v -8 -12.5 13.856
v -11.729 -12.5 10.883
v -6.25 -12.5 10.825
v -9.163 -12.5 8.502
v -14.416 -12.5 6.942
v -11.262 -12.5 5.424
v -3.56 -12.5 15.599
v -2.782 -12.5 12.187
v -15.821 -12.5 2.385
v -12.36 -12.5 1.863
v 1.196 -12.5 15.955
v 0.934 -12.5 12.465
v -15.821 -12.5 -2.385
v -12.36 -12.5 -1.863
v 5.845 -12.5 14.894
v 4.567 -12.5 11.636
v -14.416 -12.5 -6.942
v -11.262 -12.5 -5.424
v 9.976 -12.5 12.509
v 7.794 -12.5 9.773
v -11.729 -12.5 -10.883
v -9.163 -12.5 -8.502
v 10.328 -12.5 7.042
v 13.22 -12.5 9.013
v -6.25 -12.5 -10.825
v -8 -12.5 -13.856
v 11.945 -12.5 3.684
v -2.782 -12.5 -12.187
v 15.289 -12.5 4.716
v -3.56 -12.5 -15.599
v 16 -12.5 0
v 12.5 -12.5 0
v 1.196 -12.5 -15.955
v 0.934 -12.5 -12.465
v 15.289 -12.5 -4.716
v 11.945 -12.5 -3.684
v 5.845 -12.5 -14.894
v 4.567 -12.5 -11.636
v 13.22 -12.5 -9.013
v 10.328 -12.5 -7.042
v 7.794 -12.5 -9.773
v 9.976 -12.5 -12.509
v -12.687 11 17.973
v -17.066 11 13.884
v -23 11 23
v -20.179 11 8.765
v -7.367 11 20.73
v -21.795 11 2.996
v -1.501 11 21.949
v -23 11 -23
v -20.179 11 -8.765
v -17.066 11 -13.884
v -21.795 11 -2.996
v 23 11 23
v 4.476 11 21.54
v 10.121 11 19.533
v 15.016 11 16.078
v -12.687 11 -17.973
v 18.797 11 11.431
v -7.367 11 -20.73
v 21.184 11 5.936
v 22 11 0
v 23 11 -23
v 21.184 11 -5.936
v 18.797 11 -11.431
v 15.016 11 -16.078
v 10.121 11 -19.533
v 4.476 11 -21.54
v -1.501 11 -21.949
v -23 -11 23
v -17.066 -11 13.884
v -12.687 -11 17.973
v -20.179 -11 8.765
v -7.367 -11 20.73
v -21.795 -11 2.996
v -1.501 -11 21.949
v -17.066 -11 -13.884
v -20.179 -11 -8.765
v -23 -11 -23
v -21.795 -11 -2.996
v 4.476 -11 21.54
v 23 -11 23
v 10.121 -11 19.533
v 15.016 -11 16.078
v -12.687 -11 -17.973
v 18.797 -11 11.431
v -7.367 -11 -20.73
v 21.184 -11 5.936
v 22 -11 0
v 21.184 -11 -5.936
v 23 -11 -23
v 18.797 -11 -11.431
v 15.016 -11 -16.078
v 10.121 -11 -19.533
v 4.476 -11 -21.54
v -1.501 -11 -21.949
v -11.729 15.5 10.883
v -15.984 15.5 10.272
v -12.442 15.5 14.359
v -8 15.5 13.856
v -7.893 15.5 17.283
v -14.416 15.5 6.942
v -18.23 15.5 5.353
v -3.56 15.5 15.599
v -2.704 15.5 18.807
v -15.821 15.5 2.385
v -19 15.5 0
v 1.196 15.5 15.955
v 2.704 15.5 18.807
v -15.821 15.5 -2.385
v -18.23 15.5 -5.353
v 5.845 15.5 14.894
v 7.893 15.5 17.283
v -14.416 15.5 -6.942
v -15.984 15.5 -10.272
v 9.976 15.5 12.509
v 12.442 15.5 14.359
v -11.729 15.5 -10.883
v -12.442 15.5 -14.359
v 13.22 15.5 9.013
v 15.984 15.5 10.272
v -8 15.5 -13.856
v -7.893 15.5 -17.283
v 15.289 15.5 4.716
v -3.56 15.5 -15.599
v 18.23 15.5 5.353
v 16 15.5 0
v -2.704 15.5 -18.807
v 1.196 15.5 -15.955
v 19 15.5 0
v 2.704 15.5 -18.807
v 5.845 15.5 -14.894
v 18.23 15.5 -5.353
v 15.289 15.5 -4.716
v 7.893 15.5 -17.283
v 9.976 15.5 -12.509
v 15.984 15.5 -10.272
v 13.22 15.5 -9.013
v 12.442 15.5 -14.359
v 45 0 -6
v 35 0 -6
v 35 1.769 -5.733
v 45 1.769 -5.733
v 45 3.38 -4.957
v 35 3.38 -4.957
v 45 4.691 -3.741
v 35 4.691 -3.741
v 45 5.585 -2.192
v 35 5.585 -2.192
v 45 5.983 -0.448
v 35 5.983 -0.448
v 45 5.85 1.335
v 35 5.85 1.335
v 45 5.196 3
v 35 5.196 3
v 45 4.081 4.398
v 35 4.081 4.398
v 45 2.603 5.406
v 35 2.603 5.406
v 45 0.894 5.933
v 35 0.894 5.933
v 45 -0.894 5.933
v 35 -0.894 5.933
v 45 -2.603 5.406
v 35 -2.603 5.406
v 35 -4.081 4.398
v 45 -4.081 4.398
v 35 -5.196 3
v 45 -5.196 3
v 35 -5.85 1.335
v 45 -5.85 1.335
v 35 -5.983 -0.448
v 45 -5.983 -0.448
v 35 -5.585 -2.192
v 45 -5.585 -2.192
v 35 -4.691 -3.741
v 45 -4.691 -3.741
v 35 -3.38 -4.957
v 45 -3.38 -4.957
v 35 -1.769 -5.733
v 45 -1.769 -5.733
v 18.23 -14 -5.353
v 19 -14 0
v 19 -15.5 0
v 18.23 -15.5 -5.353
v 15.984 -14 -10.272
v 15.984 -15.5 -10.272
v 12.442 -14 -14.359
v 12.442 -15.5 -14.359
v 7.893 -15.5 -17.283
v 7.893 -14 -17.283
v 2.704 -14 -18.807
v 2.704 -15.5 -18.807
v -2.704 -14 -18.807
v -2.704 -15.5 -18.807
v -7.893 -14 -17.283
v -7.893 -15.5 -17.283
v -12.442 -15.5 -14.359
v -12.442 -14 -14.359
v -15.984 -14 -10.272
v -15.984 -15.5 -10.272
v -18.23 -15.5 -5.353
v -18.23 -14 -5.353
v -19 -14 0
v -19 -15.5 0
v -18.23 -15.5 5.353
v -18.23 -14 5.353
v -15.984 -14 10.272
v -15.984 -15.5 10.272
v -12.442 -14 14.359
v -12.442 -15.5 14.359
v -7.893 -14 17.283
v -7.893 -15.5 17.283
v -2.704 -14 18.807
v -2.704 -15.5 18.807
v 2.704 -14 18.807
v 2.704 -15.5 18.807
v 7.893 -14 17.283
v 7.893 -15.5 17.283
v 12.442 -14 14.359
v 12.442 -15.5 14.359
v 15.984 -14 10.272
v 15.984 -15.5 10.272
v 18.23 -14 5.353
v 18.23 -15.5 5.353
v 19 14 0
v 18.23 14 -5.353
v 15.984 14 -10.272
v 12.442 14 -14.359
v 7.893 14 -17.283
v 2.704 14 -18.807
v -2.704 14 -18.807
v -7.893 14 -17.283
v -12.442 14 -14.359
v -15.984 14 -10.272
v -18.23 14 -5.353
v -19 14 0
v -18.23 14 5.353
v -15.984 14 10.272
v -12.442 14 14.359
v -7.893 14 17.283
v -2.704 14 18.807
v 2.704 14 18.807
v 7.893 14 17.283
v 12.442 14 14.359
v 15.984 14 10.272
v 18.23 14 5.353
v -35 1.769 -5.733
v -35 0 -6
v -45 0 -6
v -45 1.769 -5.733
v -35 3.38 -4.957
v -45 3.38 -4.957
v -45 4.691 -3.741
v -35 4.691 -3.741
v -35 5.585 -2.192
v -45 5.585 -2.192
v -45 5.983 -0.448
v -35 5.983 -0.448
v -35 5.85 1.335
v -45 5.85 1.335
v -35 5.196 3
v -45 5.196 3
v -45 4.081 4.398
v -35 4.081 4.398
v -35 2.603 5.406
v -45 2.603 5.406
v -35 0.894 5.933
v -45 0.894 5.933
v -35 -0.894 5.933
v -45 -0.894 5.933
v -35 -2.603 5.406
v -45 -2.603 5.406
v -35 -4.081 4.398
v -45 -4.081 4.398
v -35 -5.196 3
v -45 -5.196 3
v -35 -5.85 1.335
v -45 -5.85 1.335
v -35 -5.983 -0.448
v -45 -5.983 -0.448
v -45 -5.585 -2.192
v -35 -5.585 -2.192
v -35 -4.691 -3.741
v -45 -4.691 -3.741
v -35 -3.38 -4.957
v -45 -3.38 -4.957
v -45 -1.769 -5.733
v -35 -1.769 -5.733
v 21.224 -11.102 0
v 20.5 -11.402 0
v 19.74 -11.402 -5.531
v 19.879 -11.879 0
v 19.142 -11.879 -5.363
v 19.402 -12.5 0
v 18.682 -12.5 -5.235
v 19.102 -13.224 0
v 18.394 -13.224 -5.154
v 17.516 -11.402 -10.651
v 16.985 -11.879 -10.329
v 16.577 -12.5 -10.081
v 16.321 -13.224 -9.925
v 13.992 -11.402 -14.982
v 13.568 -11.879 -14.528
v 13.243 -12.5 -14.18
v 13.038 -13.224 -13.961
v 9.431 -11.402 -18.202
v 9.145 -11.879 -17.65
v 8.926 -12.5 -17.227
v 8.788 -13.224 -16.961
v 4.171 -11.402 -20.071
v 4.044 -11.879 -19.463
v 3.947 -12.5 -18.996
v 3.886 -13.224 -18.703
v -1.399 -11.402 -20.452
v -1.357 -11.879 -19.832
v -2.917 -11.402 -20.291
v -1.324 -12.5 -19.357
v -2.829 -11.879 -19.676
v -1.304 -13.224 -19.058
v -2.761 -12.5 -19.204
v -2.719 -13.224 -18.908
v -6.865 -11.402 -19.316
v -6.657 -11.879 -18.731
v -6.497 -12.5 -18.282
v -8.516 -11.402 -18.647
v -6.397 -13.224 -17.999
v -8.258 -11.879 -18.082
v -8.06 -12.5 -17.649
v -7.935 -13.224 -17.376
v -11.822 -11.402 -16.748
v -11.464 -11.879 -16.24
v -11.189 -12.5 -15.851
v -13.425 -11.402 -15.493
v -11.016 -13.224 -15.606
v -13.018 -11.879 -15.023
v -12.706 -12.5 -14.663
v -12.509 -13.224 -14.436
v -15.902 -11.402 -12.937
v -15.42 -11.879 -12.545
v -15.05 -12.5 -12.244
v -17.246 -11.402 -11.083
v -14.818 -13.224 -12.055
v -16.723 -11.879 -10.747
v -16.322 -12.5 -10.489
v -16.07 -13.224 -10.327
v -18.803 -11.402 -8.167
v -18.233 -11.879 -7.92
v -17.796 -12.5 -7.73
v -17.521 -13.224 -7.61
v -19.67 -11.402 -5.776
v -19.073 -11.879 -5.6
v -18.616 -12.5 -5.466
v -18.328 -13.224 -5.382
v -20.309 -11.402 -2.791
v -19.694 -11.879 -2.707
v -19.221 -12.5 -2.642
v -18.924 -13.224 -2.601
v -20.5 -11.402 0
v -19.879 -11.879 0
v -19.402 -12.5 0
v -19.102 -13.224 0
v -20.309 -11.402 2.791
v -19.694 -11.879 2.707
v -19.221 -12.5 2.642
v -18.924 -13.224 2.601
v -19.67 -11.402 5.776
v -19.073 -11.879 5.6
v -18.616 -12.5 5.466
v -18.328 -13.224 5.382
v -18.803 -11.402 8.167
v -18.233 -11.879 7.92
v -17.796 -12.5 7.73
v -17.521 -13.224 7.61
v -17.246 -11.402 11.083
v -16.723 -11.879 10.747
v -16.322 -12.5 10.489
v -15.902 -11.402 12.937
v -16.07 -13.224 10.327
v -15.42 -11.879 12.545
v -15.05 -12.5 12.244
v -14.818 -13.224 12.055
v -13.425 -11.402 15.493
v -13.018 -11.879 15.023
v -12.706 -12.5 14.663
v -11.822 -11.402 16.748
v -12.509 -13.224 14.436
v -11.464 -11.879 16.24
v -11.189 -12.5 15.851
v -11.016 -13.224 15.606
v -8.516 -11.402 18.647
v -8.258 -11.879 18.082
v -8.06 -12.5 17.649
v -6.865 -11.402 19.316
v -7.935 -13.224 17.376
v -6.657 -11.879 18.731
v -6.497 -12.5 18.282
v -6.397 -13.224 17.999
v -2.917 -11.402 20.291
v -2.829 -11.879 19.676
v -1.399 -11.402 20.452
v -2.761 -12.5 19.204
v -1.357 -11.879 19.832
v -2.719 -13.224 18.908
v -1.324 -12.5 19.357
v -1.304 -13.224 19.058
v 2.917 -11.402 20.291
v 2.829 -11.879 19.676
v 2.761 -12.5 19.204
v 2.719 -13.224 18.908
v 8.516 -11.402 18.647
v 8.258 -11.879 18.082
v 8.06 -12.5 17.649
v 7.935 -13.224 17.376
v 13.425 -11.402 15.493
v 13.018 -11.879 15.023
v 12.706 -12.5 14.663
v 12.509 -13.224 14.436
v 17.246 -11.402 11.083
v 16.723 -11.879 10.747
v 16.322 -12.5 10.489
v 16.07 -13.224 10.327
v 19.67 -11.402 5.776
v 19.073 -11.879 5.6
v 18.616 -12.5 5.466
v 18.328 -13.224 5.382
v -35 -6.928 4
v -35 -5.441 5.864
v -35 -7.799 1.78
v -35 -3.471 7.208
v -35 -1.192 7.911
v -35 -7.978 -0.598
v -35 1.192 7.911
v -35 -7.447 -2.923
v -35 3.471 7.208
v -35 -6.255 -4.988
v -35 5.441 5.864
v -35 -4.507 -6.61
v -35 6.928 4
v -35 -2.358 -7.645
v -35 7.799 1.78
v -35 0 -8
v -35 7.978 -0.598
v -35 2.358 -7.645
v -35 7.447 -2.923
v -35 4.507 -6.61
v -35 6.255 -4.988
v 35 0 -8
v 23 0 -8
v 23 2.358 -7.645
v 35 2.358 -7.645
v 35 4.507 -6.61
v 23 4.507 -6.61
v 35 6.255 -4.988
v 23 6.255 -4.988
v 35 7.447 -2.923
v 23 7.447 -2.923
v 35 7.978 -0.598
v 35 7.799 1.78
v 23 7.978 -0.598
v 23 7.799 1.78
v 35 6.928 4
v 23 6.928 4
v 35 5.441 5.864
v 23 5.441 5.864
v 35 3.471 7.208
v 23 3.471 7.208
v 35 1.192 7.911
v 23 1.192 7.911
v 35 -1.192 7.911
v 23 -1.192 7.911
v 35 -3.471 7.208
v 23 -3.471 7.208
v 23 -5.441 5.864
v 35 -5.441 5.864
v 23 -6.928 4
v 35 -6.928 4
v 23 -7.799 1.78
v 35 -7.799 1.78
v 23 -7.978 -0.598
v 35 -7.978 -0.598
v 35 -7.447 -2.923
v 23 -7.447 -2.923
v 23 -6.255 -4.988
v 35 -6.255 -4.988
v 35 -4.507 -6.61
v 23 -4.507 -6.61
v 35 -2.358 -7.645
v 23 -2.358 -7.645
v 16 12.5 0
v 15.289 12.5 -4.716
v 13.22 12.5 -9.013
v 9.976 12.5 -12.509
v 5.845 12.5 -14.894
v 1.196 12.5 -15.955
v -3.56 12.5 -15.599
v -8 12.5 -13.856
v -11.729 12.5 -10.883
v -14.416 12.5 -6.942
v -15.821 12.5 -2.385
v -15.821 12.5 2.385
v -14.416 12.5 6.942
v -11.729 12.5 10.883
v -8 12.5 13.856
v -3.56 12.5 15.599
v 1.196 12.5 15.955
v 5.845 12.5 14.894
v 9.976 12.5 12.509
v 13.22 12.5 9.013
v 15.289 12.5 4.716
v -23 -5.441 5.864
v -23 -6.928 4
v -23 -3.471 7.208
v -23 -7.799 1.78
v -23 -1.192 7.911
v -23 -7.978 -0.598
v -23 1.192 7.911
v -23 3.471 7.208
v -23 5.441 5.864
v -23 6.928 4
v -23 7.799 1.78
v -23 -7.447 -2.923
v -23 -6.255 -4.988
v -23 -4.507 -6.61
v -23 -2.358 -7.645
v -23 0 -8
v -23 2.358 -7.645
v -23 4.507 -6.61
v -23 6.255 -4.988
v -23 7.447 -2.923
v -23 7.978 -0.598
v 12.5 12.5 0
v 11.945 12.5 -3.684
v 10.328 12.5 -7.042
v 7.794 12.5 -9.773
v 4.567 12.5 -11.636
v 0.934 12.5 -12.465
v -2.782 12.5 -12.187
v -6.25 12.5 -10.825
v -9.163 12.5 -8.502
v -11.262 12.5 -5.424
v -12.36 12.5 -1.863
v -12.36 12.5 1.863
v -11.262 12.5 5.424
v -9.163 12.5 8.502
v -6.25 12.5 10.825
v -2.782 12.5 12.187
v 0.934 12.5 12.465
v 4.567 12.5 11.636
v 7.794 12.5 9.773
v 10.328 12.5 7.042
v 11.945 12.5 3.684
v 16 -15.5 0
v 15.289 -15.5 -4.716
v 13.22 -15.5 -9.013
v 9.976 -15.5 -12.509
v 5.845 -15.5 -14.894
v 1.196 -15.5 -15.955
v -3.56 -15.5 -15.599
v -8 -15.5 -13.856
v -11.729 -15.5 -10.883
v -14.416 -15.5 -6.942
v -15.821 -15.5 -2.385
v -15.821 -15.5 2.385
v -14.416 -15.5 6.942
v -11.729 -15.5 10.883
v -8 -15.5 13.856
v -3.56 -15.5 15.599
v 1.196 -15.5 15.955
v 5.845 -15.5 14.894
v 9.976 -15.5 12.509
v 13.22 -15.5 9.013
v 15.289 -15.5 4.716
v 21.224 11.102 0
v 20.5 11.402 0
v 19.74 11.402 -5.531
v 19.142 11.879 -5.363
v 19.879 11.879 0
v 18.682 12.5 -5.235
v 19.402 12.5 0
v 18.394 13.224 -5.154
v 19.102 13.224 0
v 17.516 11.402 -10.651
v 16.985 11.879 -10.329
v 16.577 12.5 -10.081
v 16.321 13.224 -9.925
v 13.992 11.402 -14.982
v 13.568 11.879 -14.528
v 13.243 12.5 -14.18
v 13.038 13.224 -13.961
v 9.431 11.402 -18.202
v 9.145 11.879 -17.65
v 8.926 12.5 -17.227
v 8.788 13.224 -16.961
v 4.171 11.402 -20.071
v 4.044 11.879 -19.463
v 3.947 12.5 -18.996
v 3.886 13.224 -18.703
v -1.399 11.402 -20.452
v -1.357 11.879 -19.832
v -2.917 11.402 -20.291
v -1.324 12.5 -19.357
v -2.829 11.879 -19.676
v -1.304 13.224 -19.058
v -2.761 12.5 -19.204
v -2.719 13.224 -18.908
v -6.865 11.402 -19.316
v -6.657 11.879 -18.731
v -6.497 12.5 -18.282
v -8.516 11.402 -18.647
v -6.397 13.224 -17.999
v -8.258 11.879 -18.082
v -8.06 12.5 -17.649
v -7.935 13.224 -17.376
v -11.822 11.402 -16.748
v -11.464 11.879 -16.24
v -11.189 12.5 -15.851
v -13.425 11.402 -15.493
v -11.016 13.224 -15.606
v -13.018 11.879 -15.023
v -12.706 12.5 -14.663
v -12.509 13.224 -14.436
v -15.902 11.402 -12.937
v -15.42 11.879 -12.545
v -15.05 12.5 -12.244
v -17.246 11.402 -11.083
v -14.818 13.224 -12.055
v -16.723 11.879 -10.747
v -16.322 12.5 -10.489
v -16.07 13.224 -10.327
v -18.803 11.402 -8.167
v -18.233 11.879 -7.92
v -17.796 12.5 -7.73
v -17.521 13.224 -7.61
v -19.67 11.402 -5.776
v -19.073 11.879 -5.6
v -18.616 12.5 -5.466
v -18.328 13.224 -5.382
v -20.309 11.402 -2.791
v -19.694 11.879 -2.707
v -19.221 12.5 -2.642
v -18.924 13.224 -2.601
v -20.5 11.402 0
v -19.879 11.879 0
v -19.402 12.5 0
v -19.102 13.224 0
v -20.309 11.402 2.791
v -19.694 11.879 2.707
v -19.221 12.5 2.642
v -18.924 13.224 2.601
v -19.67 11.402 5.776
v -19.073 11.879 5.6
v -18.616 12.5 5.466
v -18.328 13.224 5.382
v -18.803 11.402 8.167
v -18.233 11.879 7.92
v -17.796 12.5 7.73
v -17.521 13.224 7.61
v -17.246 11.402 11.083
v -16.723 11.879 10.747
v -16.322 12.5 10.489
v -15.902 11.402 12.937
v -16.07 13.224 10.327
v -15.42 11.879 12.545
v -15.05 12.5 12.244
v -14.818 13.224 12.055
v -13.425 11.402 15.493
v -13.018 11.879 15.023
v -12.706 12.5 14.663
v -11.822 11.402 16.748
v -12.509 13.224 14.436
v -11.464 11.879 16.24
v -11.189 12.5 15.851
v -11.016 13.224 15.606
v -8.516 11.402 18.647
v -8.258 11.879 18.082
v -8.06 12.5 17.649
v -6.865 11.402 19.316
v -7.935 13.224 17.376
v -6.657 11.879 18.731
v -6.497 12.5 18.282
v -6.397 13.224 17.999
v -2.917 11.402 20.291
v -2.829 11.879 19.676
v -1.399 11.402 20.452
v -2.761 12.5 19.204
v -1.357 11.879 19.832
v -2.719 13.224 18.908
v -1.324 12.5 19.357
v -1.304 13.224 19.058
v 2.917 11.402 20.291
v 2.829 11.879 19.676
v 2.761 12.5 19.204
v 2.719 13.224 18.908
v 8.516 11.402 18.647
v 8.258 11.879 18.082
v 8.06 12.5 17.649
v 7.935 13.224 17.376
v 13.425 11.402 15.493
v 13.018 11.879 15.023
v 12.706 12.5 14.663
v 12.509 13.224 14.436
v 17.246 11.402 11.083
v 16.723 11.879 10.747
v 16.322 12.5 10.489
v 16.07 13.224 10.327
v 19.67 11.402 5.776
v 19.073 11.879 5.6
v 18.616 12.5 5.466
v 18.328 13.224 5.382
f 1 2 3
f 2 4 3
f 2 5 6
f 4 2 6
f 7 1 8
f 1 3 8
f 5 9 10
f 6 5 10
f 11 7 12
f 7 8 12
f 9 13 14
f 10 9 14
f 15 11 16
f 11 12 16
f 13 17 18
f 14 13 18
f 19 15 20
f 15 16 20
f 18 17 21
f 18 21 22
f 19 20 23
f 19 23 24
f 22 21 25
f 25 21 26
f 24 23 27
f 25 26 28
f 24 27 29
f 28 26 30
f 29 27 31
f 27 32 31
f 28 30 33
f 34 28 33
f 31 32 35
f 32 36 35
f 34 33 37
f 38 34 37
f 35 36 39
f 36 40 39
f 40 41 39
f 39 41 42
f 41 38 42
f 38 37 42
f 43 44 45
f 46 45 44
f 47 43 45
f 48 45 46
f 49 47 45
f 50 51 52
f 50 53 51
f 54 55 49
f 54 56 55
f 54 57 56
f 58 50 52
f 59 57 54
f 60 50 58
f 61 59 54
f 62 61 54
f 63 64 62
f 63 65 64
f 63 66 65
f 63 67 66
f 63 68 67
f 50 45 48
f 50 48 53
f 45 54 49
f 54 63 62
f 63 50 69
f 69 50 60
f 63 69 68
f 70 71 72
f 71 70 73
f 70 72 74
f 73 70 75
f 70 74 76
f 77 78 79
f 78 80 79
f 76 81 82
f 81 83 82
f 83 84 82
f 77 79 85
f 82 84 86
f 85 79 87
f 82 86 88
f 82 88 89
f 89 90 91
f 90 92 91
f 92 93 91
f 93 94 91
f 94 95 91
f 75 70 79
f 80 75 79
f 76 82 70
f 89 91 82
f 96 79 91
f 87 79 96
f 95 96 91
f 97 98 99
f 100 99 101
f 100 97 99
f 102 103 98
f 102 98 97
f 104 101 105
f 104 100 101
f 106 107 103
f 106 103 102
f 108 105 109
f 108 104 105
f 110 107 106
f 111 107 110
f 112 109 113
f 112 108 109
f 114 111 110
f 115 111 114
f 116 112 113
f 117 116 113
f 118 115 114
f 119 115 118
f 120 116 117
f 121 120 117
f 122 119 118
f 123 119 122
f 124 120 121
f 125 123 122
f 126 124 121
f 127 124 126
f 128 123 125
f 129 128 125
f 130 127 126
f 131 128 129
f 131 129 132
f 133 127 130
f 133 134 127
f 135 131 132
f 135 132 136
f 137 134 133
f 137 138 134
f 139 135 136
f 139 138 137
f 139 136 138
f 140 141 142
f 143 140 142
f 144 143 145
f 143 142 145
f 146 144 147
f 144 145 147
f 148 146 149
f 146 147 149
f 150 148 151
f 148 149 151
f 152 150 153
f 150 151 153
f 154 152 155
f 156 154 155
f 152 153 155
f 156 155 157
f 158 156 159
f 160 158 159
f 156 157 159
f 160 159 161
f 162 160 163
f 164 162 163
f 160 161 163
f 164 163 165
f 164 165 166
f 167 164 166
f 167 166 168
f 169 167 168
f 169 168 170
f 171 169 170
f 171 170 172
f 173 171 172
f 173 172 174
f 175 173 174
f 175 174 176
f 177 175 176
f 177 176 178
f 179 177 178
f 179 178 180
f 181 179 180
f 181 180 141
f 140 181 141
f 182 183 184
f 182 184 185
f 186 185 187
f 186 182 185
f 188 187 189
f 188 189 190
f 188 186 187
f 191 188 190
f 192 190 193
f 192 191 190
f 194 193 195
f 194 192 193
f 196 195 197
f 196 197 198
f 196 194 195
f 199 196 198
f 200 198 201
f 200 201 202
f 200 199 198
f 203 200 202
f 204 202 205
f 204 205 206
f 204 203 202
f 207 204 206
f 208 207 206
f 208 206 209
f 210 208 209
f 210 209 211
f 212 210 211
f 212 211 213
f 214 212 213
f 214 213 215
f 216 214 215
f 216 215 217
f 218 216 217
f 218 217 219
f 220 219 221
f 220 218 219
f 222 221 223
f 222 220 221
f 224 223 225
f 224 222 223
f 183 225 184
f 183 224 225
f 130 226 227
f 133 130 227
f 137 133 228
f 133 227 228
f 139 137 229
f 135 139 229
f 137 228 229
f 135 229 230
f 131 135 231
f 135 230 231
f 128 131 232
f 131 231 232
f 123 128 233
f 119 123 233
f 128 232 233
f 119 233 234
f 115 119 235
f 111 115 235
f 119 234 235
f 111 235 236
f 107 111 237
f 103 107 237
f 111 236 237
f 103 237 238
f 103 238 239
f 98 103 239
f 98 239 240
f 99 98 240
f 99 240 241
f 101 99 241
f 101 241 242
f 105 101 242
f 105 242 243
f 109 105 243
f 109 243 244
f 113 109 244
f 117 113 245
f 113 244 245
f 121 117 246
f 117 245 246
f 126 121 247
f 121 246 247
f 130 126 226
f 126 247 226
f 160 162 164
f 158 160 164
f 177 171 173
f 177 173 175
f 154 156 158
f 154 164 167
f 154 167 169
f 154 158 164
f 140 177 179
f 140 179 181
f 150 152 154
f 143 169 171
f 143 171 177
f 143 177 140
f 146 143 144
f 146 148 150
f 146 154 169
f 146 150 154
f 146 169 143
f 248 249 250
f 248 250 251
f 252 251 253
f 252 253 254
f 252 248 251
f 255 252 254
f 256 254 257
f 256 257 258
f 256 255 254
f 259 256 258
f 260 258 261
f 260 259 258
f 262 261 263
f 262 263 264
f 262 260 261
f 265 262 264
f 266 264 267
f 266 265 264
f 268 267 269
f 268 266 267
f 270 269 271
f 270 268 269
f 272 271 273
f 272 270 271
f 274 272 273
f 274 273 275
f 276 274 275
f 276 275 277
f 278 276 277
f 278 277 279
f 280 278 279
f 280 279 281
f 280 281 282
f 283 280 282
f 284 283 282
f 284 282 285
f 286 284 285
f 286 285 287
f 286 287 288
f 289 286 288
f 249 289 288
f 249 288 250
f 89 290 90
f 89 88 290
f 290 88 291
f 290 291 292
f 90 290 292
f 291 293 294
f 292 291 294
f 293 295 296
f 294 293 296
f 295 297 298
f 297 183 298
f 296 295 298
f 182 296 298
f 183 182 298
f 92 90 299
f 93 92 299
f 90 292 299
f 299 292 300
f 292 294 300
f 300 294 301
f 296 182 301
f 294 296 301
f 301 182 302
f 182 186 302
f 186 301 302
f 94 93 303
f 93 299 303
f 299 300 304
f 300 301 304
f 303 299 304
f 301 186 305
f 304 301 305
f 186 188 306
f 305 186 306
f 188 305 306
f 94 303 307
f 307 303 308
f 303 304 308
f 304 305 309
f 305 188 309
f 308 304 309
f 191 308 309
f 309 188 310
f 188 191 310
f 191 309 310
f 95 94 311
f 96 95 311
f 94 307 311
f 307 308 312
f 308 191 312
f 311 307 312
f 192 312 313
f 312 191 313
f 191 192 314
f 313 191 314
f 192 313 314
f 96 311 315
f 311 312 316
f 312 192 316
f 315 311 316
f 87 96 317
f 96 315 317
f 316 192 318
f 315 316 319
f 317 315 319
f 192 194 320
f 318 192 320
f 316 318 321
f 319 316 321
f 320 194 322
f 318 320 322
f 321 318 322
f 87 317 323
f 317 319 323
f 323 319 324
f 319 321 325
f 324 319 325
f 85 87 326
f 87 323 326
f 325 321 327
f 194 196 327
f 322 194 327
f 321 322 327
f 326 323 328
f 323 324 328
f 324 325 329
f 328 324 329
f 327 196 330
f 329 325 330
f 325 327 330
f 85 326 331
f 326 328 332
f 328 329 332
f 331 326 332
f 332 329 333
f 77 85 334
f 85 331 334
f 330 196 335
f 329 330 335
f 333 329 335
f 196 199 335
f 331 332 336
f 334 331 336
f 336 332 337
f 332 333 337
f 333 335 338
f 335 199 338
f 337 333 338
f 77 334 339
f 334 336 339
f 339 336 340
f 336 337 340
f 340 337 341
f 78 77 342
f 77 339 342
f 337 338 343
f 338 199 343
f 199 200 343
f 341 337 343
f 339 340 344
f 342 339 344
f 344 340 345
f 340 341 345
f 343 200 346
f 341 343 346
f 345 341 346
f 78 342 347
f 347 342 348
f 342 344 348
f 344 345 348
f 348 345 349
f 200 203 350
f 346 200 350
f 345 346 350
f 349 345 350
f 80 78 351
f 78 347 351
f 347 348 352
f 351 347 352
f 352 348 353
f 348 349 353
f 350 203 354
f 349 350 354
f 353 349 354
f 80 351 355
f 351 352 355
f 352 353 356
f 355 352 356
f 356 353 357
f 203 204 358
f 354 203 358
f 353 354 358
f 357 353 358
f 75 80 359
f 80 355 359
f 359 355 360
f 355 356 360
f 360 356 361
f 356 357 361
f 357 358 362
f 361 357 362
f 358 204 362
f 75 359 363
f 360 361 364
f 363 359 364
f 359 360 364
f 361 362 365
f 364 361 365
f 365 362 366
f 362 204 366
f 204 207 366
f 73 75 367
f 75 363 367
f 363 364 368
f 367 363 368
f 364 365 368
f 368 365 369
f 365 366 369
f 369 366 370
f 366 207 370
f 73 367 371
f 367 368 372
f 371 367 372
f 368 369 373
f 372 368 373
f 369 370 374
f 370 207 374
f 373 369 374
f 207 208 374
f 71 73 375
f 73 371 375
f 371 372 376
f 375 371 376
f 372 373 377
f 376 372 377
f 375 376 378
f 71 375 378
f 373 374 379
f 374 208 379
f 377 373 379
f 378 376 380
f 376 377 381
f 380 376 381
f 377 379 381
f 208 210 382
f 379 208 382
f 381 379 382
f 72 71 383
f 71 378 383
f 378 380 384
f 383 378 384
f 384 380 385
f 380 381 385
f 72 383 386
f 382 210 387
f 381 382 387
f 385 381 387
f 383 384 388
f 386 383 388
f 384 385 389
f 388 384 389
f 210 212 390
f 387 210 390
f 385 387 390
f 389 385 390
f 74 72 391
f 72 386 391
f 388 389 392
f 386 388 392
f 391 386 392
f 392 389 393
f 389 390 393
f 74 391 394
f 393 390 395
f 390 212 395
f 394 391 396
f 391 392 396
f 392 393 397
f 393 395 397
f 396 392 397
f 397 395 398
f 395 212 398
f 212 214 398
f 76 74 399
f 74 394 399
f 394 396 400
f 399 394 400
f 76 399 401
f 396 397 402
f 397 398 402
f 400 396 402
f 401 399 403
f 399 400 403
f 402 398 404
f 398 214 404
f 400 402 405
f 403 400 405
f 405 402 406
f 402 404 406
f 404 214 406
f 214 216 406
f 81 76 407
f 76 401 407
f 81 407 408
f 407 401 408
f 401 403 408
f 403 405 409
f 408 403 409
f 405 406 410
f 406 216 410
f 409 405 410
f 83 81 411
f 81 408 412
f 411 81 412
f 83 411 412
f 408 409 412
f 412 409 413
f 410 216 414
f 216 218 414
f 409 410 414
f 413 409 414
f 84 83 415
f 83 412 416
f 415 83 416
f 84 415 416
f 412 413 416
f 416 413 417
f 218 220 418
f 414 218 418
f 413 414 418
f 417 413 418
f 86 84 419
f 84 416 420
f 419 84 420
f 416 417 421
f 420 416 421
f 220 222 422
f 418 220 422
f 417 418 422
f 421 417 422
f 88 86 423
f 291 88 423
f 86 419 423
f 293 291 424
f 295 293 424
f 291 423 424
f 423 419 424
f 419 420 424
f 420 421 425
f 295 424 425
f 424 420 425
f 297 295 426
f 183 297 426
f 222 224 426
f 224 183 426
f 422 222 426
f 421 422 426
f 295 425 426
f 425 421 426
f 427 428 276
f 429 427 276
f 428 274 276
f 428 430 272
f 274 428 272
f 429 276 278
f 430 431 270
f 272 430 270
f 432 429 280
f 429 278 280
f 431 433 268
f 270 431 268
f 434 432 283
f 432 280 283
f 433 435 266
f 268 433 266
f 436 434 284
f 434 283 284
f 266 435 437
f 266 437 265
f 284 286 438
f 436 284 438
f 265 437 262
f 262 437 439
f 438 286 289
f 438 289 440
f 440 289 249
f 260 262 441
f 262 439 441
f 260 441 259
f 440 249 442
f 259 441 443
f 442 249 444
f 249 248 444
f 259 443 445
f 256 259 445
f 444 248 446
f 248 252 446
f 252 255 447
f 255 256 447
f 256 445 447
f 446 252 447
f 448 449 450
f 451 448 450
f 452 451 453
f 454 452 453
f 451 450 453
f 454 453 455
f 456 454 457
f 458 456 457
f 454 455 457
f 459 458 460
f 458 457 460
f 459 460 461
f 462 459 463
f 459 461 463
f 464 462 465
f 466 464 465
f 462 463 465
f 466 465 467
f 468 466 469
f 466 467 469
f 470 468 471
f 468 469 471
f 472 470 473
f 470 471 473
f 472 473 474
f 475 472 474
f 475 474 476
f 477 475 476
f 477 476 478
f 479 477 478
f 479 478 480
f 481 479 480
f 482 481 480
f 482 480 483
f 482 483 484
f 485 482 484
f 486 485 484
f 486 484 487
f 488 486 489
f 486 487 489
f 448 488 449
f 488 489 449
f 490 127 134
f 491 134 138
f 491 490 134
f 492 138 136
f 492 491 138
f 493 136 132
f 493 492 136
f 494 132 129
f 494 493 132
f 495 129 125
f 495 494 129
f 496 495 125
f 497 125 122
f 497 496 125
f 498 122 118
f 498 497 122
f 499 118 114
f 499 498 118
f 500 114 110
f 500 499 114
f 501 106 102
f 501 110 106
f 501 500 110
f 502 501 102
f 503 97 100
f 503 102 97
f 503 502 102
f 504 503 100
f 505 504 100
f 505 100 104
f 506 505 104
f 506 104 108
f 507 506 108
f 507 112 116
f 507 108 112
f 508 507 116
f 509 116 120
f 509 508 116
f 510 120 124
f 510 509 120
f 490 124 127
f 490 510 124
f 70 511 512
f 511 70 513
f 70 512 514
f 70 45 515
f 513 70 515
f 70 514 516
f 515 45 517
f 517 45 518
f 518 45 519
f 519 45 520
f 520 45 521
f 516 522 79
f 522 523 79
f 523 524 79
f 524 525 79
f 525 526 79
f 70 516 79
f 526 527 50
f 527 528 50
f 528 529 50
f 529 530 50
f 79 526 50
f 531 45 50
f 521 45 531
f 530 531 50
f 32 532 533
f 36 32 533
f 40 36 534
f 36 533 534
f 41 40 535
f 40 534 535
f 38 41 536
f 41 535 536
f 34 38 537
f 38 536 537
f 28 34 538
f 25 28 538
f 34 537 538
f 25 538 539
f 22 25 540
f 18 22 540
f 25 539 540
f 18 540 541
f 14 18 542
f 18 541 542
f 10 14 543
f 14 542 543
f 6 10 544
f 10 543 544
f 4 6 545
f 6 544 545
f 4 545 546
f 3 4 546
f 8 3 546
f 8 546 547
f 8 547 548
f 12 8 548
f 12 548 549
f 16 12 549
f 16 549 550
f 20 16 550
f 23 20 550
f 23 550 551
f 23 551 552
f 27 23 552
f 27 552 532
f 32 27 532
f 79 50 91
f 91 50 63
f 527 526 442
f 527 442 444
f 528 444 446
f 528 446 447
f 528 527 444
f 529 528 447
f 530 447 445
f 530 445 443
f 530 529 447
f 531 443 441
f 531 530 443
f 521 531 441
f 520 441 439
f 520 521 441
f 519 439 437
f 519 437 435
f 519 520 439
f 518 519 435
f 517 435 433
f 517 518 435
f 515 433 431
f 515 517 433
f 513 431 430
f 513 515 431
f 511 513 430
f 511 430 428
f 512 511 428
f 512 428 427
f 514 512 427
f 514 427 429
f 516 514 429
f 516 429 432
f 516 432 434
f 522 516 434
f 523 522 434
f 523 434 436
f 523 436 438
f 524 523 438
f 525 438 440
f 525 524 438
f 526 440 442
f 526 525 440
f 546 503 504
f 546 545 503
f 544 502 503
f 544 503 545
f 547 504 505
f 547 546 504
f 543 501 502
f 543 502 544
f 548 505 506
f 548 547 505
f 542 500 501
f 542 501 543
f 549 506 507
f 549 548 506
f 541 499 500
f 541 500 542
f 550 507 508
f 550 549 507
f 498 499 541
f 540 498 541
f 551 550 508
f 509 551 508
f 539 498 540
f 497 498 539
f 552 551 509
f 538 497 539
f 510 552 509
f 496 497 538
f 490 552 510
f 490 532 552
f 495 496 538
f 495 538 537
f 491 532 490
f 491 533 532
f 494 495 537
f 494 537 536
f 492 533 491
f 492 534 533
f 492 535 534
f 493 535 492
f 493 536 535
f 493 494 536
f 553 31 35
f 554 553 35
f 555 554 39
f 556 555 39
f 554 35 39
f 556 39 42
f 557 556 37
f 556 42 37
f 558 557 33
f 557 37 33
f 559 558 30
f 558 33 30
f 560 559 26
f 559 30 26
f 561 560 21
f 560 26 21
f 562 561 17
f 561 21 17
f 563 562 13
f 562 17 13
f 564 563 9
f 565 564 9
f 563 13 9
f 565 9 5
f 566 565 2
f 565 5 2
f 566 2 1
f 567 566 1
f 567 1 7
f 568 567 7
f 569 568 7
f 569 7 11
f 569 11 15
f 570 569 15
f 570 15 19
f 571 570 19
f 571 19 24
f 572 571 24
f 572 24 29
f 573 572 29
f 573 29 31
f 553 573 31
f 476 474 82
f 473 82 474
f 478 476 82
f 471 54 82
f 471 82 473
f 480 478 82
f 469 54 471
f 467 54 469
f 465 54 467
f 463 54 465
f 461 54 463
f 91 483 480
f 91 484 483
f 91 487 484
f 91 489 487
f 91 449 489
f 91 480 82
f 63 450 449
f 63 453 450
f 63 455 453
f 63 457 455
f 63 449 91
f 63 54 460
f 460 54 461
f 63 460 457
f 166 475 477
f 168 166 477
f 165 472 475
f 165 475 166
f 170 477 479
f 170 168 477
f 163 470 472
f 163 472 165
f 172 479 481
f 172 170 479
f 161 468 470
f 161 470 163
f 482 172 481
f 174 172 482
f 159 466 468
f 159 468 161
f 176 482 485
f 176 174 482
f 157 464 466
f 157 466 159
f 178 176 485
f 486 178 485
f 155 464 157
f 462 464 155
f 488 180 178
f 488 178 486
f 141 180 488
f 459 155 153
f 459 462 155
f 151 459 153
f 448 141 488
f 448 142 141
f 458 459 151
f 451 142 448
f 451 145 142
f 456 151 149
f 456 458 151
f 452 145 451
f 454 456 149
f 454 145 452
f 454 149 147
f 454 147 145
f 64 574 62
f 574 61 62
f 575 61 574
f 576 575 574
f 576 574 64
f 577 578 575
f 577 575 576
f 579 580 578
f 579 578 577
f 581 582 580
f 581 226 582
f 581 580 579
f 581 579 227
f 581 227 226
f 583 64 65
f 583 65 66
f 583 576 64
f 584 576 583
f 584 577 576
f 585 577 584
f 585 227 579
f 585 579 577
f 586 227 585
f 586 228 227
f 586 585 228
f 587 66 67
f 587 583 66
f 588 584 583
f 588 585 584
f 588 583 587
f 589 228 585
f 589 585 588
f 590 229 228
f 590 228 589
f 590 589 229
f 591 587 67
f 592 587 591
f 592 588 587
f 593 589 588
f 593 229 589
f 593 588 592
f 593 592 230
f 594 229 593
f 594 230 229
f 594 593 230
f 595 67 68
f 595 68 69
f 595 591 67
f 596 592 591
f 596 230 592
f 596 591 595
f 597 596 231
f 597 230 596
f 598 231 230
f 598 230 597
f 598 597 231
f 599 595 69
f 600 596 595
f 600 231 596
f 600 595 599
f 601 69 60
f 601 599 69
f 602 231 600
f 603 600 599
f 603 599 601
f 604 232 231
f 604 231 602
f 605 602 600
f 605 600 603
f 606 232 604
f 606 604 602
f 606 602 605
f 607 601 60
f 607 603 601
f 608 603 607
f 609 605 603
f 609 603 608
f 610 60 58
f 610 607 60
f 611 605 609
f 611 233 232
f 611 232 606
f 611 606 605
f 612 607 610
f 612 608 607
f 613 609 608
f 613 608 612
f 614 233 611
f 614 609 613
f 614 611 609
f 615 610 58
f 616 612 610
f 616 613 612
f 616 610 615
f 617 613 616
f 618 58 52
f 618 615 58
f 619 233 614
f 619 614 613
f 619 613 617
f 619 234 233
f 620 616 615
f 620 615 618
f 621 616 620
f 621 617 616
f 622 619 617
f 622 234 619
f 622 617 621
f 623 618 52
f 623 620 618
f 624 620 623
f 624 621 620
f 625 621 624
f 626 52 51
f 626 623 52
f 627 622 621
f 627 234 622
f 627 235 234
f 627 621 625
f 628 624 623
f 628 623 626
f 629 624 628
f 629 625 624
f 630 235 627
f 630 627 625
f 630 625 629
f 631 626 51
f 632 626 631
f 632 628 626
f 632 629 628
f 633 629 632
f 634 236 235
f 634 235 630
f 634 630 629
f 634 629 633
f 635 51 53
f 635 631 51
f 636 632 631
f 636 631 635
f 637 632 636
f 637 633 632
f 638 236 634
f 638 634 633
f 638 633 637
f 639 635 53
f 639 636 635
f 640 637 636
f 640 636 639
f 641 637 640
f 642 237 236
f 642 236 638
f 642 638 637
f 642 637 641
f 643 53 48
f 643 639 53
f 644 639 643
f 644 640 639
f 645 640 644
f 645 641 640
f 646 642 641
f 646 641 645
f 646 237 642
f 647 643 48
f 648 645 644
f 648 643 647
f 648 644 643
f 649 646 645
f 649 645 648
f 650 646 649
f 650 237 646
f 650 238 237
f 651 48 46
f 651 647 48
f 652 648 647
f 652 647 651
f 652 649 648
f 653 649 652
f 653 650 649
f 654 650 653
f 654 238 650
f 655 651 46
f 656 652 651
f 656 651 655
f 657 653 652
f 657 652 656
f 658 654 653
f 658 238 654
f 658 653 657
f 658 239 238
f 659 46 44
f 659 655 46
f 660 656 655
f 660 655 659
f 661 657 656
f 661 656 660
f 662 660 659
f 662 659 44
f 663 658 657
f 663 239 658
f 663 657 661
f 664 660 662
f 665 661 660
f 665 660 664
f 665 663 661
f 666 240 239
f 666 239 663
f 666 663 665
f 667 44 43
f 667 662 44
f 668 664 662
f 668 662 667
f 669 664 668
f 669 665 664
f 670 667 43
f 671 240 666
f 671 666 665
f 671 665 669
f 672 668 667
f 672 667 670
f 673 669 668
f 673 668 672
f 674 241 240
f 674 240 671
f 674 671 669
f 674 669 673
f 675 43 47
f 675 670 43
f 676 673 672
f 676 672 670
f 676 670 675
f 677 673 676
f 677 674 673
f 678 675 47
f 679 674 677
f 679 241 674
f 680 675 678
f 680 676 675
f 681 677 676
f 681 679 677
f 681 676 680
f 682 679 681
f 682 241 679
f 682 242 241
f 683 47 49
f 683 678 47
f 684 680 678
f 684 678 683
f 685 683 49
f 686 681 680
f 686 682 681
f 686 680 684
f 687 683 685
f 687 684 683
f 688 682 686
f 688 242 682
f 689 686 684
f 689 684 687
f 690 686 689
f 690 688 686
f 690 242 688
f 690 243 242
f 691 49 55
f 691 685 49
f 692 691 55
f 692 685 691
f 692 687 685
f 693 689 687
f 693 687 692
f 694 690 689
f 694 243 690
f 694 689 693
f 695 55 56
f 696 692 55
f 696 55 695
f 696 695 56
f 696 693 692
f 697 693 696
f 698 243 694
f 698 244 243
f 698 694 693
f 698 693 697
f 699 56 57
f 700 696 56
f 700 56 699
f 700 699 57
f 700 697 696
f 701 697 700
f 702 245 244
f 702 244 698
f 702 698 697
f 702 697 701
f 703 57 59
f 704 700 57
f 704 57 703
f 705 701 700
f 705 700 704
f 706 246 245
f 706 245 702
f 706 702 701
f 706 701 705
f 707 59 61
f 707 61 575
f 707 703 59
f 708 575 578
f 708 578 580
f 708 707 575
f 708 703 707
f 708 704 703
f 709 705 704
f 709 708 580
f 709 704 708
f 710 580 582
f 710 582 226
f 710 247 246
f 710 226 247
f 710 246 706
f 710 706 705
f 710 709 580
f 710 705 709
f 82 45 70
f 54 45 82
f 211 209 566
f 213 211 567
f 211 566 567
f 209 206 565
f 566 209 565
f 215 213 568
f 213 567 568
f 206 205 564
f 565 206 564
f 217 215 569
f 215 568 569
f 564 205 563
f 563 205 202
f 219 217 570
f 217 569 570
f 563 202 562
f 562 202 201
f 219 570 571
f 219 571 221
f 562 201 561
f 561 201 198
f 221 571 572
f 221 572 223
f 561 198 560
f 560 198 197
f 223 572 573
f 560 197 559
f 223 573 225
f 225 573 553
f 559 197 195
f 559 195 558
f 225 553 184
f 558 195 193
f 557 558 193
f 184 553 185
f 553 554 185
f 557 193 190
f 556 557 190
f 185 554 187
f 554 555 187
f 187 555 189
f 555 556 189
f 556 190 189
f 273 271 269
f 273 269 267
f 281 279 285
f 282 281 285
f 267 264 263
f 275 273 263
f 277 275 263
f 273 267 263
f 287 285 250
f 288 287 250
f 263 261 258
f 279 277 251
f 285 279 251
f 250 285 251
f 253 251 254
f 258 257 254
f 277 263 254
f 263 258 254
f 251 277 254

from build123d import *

# Parameters (mm, degrees)
SKETCH1_W           = 46
SKETCH1_H           = 46
BOSS_EXTRUDE1_DEPTH = 11
SKETCH3_R           = 19
BOSS_EXTRUDE3_DEPTH = 4.5
CUT_EXTRUDE1_START  = -3
SKETCH4_R           = 16
CUT_EXTRUDE1_DEPTH  = 4
SKETCH5_R           = 12.5
CUT_EXTRUDE2_DEPTH  = 29
SKETCH6_R           = 8
BOSS_EXTRUDE4_DEPTH = 12
SKETCH6_3_R         = 6
BOSS_EXTRUDE5_DEPTH = 22
FILLET1_R           = 3


with BuildPart() as part:
    # Sketch1 → Boss-Extrude1 (new body, symmetric)
    with BuildSketch(Plane(origin=(0, 0, 0), x_dir=(1, 0, 0), z_dir=(0, 1, 0))):
        Rectangle(SKETCH1_W, SKETCH1_H)
    extrude(amount=BOSS_EXTRUDE1_DEPTH, both=True)

    # Sketch3 → Boss-Extrude3 (add)
    with BuildSketch(Plane(origin=(0, 11, 0), x_dir=(1, 0, 0), z_dir=(0, 1, 0))):
        Circle(SKETCH3_R)
    boss_extrude3 = extrude(amount=BOSS_EXTRUDE3_DEPTH)

    # Mirror1: Boss-Extrude3 across plane
    add(boss_extrude3.mirror(Plane.ZX))

    # Sketch4 → Cut-Extrude1 (cut)
    with BuildSketch(Plane(origin=(0, 15.5, 0), x_dir=(1, 0, 0), z_dir=(0, 1, 0)).offset(CUT_EXTRUDE1_START)):
        Circle(SKETCH4_R)
    cut_extrude1 = extrude(amount=CUT_EXTRUDE1_DEPTH, mode=Mode.SUBTRACT)

    # Mirror2: Cut-Extrude1 across plane
    add(cut_extrude1.mirror(Plane.ZX), mode=Mode.SUBTRACT)

    # Sketch5 → Cut-Extrude2 (cut, through all)
    with BuildSketch(Plane(origin=(0, 12.5, 0), x_dir=(1, 0, 0), z_dir=(0, 1, 0))):
        Circle(SKETCH5_R)
    extrude(amount=-CUT_EXTRUDE2_DEPTH, mode=Mode.SUBTRACT)

    # Sketch6 → Boss-Extrude4 (add)
    with BuildSketch(Plane(origin=(23, 0, 0), x_dir=(0, 0, -1), z_dir=(1, 0, 0))):
        Circle(SKETCH6_R)
    boss_extrude4 = extrude(amount=BOSS_EXTRUDE4_DEPTH)

    # Sketch6<3> → Boss-Extrude5 (add)
    with BuildSketch(Plane(origin=(23, 0, 0), x_dir=(0, 0, -1), z_dir=(1, 0, 0))):
        Circle(SKETCH6_3_R)
    boss_extrude5 = extrude(amount=BOSS_EXTRUDE5_DEPTH)

    # Mirror3: Boss-Extrude4, Boss-Extrude5 across plane
    add(boss_extrude4.mirror(Plane(origin=(0, 0, 0), x_dir=(0, 0, 1), z_dir=(1, 0, 0))))
    add(boss_extrude5.mirror(Plane(origin=(0, 0, 0), x_dir=(0, 0, 1), z_dir=(1, 0, 0))))

    # Fillet1
    fillet1_edges = [part.edges().sort_by_distance(p)[0] for p in [
        (-19, 11, 0),
        (-19, -11, 0),
    ]]
    fillet(fillet1_edges, radius=FILLET1_R)


solid = part.part
